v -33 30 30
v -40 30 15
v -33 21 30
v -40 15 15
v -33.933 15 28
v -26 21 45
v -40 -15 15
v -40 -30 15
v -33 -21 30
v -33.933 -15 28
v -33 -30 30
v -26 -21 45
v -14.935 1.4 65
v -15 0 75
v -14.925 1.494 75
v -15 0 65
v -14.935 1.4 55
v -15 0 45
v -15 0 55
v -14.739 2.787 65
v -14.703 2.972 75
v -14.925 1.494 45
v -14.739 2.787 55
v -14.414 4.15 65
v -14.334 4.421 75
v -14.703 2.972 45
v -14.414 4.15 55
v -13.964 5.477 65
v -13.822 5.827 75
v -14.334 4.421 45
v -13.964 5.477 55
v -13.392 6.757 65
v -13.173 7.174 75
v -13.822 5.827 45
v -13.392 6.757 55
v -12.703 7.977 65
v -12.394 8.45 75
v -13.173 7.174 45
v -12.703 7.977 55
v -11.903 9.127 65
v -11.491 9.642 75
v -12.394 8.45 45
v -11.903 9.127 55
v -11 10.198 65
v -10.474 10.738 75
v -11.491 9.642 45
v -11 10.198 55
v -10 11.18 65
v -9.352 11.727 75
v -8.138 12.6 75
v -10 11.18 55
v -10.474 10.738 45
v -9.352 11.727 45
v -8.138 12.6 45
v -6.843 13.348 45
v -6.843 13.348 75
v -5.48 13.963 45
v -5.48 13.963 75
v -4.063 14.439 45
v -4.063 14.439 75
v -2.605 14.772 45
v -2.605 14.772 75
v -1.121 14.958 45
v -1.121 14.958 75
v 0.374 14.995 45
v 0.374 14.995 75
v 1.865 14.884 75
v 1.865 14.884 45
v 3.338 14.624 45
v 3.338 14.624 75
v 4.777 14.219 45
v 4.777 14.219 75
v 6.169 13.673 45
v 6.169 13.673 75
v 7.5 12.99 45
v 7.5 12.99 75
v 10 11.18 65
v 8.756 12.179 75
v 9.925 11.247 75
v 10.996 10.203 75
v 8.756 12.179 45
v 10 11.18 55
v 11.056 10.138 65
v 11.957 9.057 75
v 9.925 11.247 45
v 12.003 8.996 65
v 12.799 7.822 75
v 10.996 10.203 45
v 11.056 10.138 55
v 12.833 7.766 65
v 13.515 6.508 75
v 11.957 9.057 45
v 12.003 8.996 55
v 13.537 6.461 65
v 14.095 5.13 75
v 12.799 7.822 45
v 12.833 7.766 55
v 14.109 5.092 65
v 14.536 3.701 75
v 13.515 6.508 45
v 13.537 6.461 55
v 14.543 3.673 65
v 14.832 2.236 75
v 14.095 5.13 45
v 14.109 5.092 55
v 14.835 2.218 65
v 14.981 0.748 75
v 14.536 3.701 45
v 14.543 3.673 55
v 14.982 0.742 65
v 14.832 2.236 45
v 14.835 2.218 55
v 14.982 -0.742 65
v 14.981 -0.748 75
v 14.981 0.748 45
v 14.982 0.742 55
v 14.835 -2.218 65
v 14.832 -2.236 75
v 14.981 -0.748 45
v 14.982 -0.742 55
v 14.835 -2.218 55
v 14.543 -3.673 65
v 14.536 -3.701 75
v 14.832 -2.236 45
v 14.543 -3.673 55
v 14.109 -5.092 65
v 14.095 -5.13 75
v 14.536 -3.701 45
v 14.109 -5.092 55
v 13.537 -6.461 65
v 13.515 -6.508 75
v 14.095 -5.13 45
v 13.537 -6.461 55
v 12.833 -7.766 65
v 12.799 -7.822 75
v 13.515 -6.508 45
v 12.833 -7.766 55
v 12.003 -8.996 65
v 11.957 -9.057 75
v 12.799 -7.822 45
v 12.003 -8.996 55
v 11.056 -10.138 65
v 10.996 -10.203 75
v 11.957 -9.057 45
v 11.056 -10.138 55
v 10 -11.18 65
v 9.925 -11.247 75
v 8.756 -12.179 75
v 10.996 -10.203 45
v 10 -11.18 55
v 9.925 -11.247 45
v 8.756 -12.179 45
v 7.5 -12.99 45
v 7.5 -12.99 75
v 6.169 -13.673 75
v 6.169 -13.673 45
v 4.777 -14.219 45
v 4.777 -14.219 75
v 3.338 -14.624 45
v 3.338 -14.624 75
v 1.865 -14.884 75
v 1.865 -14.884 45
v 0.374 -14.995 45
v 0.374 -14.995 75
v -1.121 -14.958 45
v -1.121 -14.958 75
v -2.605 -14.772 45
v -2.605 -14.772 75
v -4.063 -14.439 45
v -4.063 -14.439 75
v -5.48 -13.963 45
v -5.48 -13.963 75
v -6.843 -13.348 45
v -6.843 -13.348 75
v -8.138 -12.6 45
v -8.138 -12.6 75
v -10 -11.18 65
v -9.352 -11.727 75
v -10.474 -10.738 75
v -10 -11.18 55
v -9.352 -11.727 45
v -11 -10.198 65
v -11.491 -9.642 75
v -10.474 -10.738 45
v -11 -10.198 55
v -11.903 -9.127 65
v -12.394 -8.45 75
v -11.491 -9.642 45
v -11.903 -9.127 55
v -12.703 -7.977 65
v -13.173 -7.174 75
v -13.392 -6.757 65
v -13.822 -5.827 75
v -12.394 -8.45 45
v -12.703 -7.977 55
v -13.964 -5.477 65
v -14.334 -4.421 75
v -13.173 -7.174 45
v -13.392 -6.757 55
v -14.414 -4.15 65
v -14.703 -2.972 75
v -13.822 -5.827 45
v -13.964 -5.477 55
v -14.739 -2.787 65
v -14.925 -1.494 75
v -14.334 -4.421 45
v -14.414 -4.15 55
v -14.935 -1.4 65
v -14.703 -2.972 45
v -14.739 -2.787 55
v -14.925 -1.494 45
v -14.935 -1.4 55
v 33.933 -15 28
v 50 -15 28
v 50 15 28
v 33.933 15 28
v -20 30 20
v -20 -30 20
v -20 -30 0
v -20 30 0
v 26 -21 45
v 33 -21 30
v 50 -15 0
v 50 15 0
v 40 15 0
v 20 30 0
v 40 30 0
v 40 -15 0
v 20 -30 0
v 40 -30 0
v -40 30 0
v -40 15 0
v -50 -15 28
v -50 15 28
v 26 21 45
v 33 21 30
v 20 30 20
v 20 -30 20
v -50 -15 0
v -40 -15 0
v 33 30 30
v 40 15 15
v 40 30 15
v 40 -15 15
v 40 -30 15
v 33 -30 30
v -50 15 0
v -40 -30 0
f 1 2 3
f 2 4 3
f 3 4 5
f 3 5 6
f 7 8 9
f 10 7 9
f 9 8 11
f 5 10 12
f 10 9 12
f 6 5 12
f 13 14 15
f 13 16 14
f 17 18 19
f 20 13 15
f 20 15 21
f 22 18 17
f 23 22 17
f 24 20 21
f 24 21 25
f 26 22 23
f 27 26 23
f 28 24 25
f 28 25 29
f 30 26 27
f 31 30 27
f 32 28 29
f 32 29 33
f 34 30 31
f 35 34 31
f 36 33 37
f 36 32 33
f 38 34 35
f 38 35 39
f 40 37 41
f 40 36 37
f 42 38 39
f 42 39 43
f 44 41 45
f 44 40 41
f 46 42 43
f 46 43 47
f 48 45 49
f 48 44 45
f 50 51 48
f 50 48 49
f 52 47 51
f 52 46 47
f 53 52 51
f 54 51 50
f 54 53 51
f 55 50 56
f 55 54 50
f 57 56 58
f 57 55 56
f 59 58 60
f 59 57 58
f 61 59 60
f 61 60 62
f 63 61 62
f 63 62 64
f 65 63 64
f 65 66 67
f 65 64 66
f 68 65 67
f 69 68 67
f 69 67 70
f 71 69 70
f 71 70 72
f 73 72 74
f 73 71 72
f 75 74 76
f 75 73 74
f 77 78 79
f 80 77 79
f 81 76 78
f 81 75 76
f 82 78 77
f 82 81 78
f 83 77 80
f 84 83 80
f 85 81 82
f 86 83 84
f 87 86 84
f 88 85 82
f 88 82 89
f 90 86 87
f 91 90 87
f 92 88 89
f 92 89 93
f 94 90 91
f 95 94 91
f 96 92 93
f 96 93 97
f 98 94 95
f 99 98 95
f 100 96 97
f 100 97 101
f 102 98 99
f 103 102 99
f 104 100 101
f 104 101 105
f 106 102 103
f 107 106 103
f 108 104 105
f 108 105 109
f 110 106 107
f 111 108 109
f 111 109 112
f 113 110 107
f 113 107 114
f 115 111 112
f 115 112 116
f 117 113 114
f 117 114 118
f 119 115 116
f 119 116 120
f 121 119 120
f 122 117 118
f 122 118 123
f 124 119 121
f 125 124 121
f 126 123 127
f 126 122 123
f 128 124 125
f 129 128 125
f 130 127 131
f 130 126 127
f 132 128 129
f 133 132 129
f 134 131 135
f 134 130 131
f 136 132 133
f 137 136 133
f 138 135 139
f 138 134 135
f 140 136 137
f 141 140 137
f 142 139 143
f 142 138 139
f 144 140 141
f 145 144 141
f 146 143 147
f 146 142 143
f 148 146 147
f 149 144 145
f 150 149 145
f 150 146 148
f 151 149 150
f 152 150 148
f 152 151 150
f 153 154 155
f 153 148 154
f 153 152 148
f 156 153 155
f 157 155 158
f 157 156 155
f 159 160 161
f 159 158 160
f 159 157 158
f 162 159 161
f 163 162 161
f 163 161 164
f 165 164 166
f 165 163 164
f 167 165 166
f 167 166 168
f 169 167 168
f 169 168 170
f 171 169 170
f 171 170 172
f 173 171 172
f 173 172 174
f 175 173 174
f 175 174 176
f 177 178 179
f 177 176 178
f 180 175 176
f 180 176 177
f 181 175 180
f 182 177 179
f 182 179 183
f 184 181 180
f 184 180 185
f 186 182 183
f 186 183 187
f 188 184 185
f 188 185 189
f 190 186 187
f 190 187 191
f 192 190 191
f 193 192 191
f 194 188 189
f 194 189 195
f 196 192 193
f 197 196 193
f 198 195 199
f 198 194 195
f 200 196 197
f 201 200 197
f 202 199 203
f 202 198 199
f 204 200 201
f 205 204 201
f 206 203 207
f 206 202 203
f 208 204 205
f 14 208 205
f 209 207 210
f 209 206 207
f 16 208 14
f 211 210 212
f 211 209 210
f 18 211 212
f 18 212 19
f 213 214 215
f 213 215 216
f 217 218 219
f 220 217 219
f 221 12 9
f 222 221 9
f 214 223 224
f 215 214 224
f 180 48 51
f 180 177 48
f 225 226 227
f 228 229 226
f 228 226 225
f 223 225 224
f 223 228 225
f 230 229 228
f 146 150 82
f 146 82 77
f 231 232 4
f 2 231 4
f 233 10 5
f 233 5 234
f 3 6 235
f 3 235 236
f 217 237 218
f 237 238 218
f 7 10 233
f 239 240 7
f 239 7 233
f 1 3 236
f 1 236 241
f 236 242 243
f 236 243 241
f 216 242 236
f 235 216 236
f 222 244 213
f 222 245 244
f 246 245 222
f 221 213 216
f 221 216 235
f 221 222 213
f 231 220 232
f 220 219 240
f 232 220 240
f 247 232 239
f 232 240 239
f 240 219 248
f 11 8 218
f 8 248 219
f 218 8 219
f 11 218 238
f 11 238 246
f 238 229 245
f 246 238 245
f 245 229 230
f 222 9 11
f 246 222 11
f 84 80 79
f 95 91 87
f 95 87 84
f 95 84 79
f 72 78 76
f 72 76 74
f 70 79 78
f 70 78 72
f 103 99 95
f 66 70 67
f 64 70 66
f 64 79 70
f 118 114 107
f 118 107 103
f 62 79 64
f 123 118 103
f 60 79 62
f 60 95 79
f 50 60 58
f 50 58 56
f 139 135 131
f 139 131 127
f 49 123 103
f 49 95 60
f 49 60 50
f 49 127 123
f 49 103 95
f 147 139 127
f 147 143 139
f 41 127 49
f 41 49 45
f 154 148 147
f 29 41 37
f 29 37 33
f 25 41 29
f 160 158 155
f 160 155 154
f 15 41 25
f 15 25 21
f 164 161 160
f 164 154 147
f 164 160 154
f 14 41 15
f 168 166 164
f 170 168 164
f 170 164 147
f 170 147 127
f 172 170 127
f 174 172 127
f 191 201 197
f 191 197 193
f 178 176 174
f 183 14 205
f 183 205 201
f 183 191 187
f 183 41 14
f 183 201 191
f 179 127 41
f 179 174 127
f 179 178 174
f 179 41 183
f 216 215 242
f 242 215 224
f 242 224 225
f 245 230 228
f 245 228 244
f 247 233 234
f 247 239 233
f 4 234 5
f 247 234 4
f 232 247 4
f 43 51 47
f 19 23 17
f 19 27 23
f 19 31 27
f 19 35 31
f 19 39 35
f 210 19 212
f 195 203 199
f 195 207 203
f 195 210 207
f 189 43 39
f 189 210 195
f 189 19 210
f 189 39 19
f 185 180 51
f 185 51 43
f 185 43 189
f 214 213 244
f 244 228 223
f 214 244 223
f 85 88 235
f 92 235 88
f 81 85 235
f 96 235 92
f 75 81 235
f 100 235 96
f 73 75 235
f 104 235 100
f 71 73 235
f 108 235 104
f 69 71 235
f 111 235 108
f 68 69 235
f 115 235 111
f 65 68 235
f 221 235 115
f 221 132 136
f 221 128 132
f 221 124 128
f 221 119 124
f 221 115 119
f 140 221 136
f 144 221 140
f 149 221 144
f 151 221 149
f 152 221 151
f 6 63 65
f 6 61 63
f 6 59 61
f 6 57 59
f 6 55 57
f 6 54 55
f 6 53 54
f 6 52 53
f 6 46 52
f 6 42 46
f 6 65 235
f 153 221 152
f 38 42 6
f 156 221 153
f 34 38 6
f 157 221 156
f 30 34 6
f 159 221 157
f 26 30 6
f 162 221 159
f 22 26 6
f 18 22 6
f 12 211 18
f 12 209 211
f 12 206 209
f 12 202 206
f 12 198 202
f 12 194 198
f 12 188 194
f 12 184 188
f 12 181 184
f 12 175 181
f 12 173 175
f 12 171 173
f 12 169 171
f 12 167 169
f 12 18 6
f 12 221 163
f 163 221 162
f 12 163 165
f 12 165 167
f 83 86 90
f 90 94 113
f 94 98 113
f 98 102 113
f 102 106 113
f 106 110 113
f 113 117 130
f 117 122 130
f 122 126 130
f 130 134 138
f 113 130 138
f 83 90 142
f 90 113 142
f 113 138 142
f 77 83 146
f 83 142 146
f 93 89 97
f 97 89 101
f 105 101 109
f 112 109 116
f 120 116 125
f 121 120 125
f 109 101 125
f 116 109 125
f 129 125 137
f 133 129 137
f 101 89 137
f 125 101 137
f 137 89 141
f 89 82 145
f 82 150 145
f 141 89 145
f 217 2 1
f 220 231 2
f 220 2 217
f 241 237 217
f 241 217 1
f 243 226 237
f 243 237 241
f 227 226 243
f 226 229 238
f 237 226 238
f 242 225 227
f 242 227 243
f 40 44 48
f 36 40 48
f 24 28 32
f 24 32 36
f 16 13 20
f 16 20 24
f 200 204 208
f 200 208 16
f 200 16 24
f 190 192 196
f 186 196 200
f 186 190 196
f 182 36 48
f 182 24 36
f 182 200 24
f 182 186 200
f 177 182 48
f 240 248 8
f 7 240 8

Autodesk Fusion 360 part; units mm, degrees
sketch "Sketch1" plane through (0, 0, 0) normal (0, 1, 0) x (1, 0, 0)
  line L0 (20, 0) -> (40, 0)
  line L1 (40, 0) -> (40, -15)
  line L2 (26, -45) -> (0, -45)
  line L3 (-26, -45) -> (0, -45)
  line L4 (-40, 0) -> (-40, -15)
  line L5 (-20, 0) -> (-40, 0)
  line L6 (20, -20) -> (-20, -20)
  line L7 (-20, -20) -> (-20, 0)
  line L8 (20, 0) -> (20, -20)
  line L9 (-40, 0) -> (-40, -15)
  line L10 (0, -45) -> (-26, -45)
  line L11 (-40, -15) -> (-26, -45)
  line L12 (40, -15) -> (26, -45)
  dimension "d5" = 15
  dimension "d6" = 26
extrude "Extrude1" add sketch "Sketch1" along normal mid plane 60
sketch "Sketch3" plane through (0, 0, 0) normal (1, 0, 0) x (0, 1, 0)
  line L0 (-30, 45) -> (-21, 45)
  line L1 (-21, 45) -> (-21, 30)
  line L2 (-21, 30) -> (-30, 30)
  line L3 (-30, 30) -> (-30, 45)
  line L4 (21, 45) -> (21, 30)
  line L5 (21, 30) -> (30, 30)
  line L6 (30, 30) -> (30, 45)
  line L7 (30, 45) -> (21, 45)
  dimension "d9" = 9
  dimension "d10" = 15
extrude "Extrude2" cut sketch "Sketch3" along normal mid plane 120
sketch "Sketch4" plane through (0, 0, 45) normal (0, 0, 1) x (-1, 0, 0)
  line L0 (-26, -21) -> (26, -21)
  line L1 (26, -21) -> (26, 21)
  line L2 (26, 21) -> (-26, 21)
  line L3 (-26, 21) -> (-26, -21)
  line L4 (40, 30) -> (40, 15)
  line L5 (40, 15) -> (50, 15)
  line L6 (50, 15) -> (50, -15)
  line L7 (50, -15) -> (40, -15)
  line L8 (40, -15) -> (28, -15)
  line L9 (28, -15) -> (28, 15)
  line L10 (28, 15) -> (40, 15)
  line L11 (-50, 15) -> (-50, -15)
  line L12 (-50, -15) -> (-40, -15)
  line L13 (-40, -15) -> (-28, -15)
  line L14 (-28, -15) -> (-28, 15)
  line L15 (-28, 15) -> (-40, 15)
  line L16 (-40, 15) -> (-50, 15)
  dimension "d13" = 15
  dimension "d14" = 10
  dimension "d15" = 30
extrude "Extrude3" add sketch "Sketch4" along normal blind 28 from surface at -45 contours L5 L6 L7 L8 L9 L10 | L11 L12 L13 L14 L15 L16
sketch "Sketch5" plane through (0, 0, 45) normal (0, 0, 1) x (-1, 0, 0)
  line L0 (-26, -21) -> (26, -21)
  line L1 (26, -21) -> (26, 21)
  line L2 (26, 21) -> (-26, 21)
  line L3 (-26, 21) -> (-26, -21)
  circle A0 centre (0, 0) radius 15
  dimension "d19" = 30
extrude "Extrude4" add sketch "Sketch5" along normal blind 30 contours A0
sketch "Sketch6" plane through (0, 0, 0) normal (0, 1, 0) x (-1, 0, 0)
  line L0 (-10, 55) -> (-10, 65)
  line L1 (-10, 55) -> (-18, 55)
  line L2 (-18, 55) -> (-18, 65)
  line L3 (-18, 65) -> (-10, 65)
  line L4 (-10, 65) -> (-10, 55)
  line L5 (18, 55) -> (18, 65)
  line L6 (10, 55) -> (18, 55)
  line L7 (10, 65) -> (10, 55)
  line L8 (18, 65) -> (10, 65)
extrude "Extrude5" cut sketch "Sketch6" along normal mid plane 60
